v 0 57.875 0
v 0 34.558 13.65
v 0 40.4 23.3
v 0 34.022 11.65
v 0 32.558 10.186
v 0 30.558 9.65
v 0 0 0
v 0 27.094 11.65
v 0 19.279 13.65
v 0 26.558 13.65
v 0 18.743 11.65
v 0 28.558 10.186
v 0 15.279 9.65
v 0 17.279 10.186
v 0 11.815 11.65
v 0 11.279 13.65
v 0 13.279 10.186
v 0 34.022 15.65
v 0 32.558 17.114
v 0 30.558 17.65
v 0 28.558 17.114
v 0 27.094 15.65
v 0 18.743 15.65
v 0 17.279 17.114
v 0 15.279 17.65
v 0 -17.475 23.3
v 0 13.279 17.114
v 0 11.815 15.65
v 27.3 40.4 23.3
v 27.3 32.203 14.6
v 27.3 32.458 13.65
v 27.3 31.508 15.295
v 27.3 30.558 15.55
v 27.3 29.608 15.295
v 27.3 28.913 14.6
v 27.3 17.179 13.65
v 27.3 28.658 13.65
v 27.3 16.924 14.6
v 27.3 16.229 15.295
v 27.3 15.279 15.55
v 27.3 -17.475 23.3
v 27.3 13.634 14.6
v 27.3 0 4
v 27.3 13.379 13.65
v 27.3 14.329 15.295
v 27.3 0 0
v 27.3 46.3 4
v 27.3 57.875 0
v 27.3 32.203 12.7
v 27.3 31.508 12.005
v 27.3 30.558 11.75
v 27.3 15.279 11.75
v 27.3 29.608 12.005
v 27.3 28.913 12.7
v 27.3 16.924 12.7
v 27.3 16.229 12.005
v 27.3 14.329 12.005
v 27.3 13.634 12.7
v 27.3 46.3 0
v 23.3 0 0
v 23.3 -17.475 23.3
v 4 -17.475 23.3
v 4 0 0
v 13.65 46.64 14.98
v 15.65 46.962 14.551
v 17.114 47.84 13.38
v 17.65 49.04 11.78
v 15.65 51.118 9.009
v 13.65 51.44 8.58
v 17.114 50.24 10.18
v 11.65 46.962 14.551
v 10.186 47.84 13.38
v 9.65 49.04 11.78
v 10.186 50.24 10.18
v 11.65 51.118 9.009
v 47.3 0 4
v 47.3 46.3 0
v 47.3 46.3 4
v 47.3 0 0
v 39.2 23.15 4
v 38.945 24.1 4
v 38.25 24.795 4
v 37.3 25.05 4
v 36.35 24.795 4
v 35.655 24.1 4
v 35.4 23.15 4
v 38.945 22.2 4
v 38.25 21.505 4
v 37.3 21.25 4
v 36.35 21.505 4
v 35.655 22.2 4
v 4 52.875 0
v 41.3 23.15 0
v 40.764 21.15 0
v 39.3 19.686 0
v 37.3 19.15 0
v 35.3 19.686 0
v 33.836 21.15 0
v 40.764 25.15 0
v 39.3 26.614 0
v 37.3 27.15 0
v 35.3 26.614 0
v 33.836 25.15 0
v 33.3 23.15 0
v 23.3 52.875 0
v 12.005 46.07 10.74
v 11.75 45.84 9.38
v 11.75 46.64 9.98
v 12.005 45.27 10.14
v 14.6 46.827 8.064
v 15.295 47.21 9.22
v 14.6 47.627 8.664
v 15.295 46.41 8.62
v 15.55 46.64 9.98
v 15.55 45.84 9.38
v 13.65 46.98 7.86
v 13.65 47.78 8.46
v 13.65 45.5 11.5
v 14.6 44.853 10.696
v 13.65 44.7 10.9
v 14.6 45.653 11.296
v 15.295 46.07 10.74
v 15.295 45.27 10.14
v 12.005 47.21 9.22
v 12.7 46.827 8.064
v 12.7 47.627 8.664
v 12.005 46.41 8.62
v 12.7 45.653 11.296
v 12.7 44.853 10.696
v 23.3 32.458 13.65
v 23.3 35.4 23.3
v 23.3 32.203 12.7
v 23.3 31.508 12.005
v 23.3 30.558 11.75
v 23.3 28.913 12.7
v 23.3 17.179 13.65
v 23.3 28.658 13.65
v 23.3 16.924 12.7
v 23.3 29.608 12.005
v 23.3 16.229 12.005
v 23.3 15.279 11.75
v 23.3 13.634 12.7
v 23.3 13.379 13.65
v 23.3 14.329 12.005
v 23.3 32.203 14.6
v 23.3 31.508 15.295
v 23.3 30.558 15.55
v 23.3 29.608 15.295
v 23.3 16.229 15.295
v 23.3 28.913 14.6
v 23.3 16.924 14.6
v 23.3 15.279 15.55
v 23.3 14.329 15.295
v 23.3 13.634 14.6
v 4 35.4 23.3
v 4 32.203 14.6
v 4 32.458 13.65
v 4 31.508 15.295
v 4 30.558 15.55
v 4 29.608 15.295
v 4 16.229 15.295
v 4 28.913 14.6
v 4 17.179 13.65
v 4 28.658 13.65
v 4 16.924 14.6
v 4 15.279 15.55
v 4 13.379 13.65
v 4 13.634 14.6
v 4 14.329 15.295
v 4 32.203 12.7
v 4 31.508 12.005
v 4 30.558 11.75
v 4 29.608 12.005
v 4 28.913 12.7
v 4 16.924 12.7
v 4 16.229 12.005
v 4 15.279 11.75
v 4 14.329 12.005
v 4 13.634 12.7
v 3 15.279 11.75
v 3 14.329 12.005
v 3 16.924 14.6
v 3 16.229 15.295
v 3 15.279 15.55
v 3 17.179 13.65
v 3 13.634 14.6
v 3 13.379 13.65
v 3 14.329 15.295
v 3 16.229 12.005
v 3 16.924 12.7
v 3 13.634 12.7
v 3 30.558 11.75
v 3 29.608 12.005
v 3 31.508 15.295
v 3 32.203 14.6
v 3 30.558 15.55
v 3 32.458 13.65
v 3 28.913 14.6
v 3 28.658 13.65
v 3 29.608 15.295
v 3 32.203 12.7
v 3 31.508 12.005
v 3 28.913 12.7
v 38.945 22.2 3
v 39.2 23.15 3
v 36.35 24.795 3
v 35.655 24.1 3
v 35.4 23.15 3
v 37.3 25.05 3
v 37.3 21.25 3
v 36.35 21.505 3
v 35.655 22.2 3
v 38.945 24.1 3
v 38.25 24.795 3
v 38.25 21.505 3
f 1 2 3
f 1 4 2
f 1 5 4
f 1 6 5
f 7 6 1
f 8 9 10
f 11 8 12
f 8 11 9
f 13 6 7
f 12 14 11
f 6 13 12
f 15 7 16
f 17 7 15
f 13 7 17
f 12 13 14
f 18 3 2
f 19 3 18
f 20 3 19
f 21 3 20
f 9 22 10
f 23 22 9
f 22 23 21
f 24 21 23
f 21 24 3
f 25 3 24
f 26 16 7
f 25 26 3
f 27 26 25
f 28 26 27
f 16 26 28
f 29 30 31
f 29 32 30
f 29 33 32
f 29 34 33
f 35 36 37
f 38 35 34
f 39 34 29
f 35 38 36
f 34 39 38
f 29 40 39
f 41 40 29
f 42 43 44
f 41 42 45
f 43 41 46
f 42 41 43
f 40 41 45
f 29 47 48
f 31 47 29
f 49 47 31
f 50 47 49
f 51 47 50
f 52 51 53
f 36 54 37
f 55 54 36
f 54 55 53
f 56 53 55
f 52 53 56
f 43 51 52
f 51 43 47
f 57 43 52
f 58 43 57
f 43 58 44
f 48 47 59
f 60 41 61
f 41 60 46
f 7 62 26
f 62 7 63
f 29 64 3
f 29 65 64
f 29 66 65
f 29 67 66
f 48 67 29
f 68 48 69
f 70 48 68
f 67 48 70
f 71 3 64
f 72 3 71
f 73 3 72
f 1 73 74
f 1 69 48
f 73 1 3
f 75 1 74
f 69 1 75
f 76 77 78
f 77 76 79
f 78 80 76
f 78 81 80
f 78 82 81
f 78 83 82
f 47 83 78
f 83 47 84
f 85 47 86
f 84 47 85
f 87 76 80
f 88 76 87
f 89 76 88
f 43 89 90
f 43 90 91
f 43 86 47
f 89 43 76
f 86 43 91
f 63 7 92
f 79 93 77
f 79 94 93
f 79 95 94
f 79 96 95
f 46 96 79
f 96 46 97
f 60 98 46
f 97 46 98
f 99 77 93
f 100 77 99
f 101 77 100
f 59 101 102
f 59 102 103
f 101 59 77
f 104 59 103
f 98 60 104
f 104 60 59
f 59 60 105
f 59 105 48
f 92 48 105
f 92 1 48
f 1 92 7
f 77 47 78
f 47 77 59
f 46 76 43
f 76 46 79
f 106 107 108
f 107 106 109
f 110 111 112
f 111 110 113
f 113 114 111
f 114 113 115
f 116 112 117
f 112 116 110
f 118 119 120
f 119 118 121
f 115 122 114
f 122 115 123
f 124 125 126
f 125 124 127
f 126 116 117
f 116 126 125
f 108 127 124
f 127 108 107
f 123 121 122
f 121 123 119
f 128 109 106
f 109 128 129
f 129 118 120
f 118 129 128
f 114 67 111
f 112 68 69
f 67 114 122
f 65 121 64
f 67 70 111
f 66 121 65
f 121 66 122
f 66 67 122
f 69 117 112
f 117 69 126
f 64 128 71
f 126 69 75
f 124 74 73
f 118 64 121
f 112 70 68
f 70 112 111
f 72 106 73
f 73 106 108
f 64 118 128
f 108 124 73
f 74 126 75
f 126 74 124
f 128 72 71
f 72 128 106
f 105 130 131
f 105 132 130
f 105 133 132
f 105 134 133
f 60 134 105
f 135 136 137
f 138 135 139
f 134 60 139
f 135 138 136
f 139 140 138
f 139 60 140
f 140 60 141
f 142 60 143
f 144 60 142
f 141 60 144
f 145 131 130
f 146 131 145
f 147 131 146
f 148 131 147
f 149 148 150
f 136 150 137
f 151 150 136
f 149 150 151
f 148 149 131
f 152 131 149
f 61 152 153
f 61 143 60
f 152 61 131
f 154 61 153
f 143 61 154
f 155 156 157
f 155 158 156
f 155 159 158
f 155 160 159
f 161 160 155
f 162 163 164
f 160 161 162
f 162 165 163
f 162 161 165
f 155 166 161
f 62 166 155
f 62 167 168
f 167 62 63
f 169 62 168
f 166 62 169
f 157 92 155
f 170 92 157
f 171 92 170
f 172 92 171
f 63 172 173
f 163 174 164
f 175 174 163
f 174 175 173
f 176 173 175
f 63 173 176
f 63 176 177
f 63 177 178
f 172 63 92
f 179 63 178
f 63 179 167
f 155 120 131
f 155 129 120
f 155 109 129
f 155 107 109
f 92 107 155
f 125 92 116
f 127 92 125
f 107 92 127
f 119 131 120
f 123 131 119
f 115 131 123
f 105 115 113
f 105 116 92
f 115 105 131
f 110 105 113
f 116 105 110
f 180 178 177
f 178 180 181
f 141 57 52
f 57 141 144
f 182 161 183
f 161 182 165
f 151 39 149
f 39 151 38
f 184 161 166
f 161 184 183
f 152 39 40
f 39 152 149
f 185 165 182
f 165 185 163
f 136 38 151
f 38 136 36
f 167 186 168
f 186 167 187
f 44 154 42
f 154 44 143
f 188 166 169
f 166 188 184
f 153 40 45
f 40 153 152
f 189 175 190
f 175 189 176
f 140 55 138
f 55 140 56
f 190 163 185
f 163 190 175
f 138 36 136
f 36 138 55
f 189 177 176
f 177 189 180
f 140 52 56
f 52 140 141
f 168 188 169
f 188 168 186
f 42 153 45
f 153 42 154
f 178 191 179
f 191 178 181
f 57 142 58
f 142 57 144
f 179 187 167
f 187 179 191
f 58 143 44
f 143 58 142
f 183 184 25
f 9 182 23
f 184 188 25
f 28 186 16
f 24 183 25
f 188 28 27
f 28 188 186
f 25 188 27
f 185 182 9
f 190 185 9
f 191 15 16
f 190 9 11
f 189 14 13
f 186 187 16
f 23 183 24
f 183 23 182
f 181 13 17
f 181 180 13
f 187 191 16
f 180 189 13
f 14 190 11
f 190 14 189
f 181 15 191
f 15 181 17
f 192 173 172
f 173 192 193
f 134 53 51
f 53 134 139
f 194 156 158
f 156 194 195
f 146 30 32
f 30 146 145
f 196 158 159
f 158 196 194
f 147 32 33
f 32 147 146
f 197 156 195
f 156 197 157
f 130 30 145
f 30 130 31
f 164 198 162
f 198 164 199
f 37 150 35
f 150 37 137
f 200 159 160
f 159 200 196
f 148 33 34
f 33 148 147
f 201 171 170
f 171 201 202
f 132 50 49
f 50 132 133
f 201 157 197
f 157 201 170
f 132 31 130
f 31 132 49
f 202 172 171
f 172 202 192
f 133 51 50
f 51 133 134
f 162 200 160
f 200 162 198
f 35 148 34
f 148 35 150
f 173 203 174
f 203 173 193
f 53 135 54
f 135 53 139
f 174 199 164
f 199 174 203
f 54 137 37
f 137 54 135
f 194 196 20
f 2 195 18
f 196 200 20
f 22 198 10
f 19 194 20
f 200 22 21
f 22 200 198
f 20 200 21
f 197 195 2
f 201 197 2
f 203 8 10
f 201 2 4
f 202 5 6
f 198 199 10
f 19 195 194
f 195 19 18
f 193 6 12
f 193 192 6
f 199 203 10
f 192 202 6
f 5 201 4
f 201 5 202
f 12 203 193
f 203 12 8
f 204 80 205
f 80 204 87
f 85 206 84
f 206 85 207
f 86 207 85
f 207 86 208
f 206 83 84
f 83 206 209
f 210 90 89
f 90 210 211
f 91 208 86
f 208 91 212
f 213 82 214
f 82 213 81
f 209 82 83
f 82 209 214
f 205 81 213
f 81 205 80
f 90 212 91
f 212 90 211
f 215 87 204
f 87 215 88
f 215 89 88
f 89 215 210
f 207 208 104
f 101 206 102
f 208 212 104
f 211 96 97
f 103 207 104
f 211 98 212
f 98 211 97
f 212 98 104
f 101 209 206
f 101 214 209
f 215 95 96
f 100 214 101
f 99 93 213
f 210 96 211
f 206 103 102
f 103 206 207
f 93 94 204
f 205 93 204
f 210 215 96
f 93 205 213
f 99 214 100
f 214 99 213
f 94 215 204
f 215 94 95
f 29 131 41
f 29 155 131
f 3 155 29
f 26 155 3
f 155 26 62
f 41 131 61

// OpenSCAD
difference(){
	union() {
		translate(v = [0, 0, 0]) {
			rotate(a = 36.8700000000, v = [1, 0, 0]) {
				translate(v = [0, 0, -50]) {
					cube(size = [27.3000000000, 46.3000000000, 100]);
				}
			}
		}
		translate(v = [27.3000000000, 0, 0]) {
			cube(size = [20, 46.3000000000, 4]);
		}
	}
	/* Holes Below*/
	union(){
		translate(v = [0, 0, 0]){
			rotate(a = 36.8700000000, v = [1, 0, 0]){
				translate(v = [0, 0, -50]){
					translate(v = [4, -1, 0]) {
						cube(size = [19.3000000000, 43.3000000000, 100]);
					}
				}
				translate(v = [13.6500000000, 46.3000000000, -20]) {
					rotate(a = -90, v = [1, 0, 0]) {
						union() {
							union() {
								translate(v = [0, 0, -5]) {
									cylinder($fn = 12, h = 5, r = 1.9000000000);
								}
								translate(v = [0, 0, -3]) {
									cylinder($fn = 12, h = 3, r1 = 1.9000000000, r2 = 4);
								}
							}
							cylinder($fn = 12, h = 1, r = 4);
						}
					}
				}
			}
		}
		translate(v = [0, 15.2790000000, 13.6500000000]) {
			rotate(a = -90, v = [0, 1, 0]) {
				union() {
					union() {
						translate(v = [0, 0, -28.3000000000]) {
							cylinder($fn = 12, h = 28.3000000000, r = 1.9000000000);
						}
						translate(v = [0, 0, -3]) {
							cylinder($fn = 12, h = 3, r1 = 1.9000000000, r2 = 4);
						}
					}
					cylinder($fn = 12, h = 1, r = 4);
				}
			}
		}
		translate(v = [0, 30.5580000000, 13.6500000000]) {
			rotate(a = -90, v = [0, 1, 0]) {
				union() {
					union() {
						translate(v = [0, 0, -28.3000000000]) {
							cylinder($fn = 12, h = 28.3000000000, r = 1.9000000000);
						}
						translate(v = [0, 0, -3]) {
							cylinder($fn = 12, h = 3, r1 = 1.9000000000, r2 = 4);
						}
					}
					cylinder($fn = 12, h = 1, r = 4);
				}
			}
		}
		translate(v = [37.3000000000, 23.1500000000, 0]) {
			rotate(a = 180, v = [0, 1, 0]) {
				union() {
					union() {
						translate(v = [0, 0, -5]) {
							cylinder($fn = 12, h = 5, r = 1.9000000000);
						}
						translate(v = [0, 0, -3]) {
							cylinder($fn = 12, h = 3, r1 = 1.9000000000, r2 = 4);
						}
					}
					cylinder($fn = 12, h = 1, r = 4);
				}
			}
		}
		translate(v = [-100, -100, -100]) {
			cube(size = [200, 200, 100]);
		}
		translate(v = [-100, -100, 23.3000000000]) {
			cube(size = [200, 200, 100]);
		}
	} /* End Holes */ 
}
